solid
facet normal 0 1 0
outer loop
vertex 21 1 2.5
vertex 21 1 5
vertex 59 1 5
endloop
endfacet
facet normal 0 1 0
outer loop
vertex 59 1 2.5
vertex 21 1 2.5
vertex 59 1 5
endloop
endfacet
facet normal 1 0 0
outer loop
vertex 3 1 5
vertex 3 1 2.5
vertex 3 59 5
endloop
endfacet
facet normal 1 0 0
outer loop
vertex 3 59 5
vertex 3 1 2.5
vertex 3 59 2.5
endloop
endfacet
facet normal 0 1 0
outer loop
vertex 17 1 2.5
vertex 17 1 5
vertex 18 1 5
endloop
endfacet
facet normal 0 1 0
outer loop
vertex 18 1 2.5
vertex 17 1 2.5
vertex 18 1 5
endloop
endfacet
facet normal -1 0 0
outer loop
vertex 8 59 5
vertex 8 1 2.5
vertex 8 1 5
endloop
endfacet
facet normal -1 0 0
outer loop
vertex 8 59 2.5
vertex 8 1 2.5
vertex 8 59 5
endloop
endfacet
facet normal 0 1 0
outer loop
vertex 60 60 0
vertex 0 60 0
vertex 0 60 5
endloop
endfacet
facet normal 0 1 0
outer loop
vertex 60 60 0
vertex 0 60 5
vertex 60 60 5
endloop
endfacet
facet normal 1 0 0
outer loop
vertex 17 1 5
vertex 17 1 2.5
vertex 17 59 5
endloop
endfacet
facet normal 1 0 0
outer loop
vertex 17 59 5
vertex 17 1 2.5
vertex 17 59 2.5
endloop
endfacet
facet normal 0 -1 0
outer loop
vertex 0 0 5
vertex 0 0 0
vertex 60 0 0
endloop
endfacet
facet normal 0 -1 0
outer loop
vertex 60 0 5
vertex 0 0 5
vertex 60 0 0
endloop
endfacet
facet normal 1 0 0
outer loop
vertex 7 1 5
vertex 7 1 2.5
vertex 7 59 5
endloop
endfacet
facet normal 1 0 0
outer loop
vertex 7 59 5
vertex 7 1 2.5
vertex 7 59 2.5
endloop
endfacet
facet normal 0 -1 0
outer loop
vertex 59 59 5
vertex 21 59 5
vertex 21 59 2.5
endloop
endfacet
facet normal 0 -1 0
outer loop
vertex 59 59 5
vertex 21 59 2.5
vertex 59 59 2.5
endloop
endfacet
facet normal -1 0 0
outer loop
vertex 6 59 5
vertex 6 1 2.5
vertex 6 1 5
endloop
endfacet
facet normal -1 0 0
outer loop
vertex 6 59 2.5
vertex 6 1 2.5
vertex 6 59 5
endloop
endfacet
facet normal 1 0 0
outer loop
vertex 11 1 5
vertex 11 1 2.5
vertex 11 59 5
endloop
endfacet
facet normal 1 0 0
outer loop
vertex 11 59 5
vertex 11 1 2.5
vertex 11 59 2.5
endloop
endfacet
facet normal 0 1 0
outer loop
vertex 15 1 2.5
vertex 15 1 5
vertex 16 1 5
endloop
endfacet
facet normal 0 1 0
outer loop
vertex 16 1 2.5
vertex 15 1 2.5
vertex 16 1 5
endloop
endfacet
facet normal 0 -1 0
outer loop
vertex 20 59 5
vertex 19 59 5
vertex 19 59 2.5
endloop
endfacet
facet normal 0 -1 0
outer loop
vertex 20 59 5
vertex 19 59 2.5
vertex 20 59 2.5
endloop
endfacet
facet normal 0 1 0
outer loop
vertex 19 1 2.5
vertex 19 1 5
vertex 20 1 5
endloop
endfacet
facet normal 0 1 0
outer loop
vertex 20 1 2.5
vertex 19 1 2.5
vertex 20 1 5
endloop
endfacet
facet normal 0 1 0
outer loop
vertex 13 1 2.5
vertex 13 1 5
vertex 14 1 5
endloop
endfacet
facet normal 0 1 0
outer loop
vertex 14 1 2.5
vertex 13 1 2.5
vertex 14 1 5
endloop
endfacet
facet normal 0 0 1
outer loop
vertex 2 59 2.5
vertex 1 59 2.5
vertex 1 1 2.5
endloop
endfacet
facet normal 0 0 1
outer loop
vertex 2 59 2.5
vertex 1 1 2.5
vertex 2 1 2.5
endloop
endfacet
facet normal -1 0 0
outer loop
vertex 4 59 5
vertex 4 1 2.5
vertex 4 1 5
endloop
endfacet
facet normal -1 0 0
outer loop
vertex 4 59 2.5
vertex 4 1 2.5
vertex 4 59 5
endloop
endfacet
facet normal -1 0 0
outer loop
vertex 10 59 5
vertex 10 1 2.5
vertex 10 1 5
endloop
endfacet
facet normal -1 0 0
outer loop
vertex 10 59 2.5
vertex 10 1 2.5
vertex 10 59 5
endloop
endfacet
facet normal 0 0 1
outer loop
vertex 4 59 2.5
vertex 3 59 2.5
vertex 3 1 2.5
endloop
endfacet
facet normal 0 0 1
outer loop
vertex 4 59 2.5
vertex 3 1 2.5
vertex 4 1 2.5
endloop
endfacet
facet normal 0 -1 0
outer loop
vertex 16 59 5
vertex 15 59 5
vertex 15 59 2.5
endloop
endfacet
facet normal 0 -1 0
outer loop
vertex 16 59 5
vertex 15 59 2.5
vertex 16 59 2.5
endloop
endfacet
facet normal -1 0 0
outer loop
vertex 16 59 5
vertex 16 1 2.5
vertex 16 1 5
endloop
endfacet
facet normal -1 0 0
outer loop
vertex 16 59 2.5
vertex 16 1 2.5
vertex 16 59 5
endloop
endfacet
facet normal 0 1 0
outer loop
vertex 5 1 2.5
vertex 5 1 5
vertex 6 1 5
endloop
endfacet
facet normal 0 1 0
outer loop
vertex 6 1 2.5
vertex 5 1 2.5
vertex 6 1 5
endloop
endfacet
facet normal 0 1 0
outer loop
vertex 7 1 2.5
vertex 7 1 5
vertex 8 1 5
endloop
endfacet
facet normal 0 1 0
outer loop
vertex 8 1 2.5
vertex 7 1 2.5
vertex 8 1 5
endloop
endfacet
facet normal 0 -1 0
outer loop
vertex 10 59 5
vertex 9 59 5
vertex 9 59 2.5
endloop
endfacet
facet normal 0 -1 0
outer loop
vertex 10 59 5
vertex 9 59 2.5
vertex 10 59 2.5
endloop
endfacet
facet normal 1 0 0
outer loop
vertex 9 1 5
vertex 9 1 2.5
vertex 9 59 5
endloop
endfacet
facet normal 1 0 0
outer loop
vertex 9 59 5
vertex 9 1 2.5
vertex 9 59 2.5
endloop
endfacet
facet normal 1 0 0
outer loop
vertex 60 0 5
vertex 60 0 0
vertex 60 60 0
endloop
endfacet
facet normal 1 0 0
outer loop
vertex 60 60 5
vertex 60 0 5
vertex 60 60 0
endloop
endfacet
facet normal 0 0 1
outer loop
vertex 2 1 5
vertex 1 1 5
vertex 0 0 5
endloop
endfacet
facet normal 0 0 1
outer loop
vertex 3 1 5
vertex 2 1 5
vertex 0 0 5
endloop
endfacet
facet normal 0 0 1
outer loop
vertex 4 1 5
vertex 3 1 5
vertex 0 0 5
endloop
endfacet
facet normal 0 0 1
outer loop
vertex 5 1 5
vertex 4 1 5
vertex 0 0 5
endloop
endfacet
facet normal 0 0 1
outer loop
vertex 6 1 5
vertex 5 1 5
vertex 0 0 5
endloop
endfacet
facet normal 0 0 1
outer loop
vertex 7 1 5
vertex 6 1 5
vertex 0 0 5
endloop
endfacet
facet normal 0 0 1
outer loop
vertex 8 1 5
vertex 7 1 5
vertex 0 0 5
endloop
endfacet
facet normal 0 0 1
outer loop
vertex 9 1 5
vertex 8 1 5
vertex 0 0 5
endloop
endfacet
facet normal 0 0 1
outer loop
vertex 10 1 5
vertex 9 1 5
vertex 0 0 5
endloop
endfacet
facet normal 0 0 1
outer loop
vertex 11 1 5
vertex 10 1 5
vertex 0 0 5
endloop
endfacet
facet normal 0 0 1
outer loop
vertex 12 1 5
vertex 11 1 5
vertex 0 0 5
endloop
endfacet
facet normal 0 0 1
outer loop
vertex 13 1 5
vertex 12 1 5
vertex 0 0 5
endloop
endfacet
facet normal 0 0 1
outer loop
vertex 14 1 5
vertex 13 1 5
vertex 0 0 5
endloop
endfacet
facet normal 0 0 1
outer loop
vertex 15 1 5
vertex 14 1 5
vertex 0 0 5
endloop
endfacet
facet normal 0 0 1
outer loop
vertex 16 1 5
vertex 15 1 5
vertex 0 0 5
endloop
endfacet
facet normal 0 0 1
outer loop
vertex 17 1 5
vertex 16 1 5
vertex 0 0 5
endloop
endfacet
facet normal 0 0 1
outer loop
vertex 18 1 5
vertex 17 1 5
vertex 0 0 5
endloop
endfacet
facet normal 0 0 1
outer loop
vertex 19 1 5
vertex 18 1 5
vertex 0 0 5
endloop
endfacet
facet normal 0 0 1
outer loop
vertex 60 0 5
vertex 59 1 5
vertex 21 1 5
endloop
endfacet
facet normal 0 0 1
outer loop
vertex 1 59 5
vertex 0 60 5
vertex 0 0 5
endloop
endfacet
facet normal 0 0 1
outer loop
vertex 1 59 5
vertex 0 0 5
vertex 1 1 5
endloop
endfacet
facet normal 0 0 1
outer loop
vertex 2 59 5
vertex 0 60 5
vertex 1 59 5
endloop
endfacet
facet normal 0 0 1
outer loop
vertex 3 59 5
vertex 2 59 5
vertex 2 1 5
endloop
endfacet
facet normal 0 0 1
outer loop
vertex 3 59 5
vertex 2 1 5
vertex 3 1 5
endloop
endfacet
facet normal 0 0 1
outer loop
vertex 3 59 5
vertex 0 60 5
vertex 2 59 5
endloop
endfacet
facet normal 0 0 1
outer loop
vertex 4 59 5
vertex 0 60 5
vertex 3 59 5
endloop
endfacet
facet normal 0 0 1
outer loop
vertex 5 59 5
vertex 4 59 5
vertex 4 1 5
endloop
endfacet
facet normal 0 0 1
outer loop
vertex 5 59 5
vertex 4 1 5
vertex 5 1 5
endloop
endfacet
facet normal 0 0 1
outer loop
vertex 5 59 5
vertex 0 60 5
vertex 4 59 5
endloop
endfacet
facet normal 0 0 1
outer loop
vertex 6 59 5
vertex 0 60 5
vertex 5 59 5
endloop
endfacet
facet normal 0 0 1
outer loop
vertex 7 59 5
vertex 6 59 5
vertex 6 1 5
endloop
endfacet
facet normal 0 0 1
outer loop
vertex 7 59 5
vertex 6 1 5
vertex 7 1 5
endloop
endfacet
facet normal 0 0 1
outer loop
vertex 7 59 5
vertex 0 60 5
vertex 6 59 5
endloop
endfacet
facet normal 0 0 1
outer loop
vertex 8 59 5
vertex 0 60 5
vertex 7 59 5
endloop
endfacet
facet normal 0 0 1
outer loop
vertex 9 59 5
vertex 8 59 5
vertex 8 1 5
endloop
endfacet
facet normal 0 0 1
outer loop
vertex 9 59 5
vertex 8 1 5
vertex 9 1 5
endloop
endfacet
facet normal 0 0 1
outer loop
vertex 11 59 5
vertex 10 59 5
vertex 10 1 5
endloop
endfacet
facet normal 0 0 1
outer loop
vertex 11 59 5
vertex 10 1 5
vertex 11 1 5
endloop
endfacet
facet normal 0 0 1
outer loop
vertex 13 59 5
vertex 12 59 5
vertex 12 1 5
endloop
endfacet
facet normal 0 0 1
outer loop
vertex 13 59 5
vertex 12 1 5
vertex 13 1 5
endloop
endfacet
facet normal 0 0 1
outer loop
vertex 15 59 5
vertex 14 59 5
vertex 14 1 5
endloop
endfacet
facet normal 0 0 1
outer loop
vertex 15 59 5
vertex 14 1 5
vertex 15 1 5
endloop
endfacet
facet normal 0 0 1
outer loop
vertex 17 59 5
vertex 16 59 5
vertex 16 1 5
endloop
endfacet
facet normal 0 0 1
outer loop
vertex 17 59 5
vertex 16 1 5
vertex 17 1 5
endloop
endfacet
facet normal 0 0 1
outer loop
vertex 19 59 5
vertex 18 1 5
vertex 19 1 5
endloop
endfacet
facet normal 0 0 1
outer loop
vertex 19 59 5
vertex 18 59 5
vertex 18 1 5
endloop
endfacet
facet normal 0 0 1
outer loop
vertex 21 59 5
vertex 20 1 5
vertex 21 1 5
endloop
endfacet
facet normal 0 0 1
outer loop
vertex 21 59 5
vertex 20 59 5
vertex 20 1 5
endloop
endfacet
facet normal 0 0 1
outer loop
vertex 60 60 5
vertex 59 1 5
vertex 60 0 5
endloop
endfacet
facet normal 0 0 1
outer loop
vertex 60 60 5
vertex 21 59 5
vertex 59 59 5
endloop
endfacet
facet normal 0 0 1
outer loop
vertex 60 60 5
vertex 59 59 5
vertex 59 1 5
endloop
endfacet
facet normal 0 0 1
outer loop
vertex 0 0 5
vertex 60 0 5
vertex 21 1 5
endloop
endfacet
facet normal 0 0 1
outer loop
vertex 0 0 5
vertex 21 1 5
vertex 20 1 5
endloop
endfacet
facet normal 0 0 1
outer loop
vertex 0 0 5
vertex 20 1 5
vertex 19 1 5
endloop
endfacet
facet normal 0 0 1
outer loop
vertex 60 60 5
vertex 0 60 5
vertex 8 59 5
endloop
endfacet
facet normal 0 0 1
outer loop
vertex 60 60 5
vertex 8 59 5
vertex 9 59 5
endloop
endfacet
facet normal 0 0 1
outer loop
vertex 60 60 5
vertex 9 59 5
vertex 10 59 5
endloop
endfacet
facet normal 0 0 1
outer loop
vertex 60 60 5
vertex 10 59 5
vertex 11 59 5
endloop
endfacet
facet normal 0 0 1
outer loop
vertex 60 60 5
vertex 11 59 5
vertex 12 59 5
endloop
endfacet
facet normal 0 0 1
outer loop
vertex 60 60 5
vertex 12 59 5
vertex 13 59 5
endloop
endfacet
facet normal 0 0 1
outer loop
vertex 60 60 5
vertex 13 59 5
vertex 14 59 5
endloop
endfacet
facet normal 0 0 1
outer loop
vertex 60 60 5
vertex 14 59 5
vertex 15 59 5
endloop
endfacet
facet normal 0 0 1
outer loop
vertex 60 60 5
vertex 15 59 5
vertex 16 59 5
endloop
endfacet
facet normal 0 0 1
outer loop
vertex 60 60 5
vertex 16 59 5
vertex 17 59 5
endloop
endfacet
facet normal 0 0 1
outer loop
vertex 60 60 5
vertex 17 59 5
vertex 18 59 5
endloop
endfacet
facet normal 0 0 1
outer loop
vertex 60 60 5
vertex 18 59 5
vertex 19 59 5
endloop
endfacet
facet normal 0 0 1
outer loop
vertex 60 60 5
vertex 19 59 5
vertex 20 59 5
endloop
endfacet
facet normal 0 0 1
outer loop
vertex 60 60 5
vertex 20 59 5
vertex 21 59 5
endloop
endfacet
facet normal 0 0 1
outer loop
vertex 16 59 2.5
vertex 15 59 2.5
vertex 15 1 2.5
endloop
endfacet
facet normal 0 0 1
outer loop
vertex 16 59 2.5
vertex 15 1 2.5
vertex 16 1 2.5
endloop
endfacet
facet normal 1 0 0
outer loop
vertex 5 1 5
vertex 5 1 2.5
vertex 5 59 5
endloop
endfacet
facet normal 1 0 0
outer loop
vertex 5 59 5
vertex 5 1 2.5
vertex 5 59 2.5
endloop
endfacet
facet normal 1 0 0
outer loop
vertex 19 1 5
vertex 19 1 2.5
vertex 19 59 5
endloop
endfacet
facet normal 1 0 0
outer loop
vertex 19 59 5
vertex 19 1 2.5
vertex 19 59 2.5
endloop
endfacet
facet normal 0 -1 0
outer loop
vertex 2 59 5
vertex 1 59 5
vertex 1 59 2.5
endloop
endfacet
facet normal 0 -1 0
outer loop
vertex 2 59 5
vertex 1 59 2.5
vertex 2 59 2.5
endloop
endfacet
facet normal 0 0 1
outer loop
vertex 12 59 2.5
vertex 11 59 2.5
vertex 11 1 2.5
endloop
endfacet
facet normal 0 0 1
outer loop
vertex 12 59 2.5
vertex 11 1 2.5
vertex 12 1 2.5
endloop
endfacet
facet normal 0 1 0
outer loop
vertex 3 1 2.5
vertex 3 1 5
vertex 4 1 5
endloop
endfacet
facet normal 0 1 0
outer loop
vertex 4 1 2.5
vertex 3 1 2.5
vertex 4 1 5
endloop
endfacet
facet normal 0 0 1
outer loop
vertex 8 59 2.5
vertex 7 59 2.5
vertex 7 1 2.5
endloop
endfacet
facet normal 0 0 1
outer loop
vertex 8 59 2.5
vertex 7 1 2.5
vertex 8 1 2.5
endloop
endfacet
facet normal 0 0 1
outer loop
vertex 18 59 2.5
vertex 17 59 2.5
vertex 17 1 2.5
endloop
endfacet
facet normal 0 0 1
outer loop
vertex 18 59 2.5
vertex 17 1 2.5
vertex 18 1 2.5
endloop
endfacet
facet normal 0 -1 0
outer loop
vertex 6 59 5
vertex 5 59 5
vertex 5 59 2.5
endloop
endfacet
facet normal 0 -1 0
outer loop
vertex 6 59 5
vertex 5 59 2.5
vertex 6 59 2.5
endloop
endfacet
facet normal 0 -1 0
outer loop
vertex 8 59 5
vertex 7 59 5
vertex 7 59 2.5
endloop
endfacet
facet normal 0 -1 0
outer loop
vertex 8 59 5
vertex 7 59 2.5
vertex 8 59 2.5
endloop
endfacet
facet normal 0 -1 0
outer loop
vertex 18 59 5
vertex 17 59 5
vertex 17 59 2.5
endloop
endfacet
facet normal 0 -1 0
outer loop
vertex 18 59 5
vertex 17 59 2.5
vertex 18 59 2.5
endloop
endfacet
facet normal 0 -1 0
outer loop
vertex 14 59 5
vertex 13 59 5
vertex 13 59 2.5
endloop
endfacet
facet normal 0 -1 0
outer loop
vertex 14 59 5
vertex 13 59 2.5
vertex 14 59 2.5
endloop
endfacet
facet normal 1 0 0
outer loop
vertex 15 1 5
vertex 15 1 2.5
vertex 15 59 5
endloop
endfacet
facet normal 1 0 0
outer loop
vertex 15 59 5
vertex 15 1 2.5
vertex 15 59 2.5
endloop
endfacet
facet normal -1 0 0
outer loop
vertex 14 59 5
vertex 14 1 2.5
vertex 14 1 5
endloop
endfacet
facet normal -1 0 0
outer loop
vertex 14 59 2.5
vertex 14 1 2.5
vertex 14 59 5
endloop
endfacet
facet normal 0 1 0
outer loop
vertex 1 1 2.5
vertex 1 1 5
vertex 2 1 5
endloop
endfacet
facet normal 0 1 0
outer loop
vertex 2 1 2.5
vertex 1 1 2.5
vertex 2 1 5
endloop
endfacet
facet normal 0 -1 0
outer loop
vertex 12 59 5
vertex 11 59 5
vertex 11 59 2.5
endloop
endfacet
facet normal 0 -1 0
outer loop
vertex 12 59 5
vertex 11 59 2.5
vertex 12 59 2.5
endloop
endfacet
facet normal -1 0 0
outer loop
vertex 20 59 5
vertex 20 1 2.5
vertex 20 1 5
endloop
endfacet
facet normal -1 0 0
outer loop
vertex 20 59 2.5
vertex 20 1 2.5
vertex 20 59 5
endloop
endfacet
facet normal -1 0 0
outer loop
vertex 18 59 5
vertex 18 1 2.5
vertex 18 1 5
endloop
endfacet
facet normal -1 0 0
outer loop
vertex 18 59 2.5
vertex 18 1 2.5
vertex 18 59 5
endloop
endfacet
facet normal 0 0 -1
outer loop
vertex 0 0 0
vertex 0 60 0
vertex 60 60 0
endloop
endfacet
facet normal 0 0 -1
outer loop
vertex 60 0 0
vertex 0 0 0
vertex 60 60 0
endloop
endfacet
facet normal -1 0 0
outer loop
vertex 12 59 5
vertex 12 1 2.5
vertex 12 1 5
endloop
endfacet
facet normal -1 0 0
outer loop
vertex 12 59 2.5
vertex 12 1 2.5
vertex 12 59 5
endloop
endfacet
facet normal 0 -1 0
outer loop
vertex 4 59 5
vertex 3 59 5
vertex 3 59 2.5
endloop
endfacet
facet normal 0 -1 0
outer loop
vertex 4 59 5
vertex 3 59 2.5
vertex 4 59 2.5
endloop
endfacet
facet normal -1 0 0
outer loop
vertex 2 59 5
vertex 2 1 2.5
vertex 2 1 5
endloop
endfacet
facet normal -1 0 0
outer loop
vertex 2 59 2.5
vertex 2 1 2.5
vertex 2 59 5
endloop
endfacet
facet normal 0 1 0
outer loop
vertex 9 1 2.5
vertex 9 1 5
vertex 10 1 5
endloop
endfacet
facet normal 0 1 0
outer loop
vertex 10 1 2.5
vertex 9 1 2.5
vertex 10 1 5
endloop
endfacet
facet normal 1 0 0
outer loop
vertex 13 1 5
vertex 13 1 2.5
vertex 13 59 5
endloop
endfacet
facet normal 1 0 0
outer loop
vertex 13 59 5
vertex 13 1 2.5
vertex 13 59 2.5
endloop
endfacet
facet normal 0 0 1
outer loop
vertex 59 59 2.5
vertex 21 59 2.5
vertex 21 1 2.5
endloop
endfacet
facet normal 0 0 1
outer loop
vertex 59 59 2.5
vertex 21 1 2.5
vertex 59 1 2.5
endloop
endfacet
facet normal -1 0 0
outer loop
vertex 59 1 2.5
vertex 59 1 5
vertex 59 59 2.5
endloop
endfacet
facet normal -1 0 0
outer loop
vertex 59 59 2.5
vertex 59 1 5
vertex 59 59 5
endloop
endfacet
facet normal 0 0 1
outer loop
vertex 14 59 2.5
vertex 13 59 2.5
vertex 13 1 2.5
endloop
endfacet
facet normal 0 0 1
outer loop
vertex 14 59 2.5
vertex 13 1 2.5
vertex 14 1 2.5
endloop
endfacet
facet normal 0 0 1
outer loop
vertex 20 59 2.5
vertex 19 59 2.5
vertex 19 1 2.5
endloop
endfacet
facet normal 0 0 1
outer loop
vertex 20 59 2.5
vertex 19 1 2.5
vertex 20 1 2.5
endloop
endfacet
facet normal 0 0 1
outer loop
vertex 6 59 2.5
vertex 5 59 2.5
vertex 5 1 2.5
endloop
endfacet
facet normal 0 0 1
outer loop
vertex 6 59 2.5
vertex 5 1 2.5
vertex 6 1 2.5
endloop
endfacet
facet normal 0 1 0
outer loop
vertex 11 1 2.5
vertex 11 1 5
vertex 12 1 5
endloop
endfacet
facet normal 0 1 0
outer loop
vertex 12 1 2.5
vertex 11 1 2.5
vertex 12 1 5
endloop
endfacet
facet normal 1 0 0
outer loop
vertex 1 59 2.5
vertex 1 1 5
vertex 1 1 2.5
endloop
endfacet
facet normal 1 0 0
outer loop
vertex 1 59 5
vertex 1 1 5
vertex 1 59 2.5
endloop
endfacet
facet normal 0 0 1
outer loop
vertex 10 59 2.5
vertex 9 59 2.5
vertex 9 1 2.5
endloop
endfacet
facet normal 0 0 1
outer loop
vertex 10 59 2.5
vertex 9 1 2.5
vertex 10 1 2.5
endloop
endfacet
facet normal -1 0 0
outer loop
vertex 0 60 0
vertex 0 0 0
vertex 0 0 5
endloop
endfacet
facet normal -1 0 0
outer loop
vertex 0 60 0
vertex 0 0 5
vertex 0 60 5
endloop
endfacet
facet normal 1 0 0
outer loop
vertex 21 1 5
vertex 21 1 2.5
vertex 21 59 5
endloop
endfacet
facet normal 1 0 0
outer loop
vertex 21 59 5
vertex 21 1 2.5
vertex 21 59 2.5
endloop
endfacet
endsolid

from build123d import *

# Parameters (mm, degrees)
F0_W     = 60
F0_H     = 60
F1_DEPTH = 5
F2_W     = 58
F2_H     = 58
F3_DEPTH = 2.5
F4_W     = 1
F4_H     = 58
F5_DEPTH = 2.5


with BuildPart() as f1:
    # F0 (on Top) → F1 (new body)
    with BuildSketch(Plane.XY):
        with Locations((30, 30)):
            Rectangle(F0_W, F0_H)
    extrude(amount=F1_DEPTH)

    # F2 (on face) → F3 (cut)
    with BuildSketch(Plane.XY.offset(5)):
        with Locations((30, 30)):
            Rectangle(F2_W, F2_H)
    extrude(amount=-F3_DEPTH, mode=Mode.SUBTRACT)

    # F4 (on face) → F5 (join)
    with BuildSketch(Plane.XY.offset(2.5)):
        with Locations((2.5, 30)):
            Rectangle(F4_W, F4_H)
        with Locations((4.5, 30)):
            Rectangle(F4_W, F4_H)
        with Locations((6.5, 30)):
            Rectangle(F4_W, F4_H)
        with Locations((8.5, 30)):
            Rectangle(F4_W, F4_H)
        with Locations((10.5, 30)):
            Rectangle(F4_W, F4_H)
        with Locations((12.5, 30)):
            Rectangle(F4_W, F4_H)
        with Locations((14.5, 30)):
            Rectangle(F4_W, F4_H)
        with Locations((16.5, 30)):
            Rectangle(F4_W, F4_H)
        with Locations((18.5, 30)):
            Rectangle(F4_W, F4_H)
        with Locations((20.5, 30)):
            Rectangle(F4_W, F4_H)
    extrude(amount=F5_DEPTH)


solid = f1.part
